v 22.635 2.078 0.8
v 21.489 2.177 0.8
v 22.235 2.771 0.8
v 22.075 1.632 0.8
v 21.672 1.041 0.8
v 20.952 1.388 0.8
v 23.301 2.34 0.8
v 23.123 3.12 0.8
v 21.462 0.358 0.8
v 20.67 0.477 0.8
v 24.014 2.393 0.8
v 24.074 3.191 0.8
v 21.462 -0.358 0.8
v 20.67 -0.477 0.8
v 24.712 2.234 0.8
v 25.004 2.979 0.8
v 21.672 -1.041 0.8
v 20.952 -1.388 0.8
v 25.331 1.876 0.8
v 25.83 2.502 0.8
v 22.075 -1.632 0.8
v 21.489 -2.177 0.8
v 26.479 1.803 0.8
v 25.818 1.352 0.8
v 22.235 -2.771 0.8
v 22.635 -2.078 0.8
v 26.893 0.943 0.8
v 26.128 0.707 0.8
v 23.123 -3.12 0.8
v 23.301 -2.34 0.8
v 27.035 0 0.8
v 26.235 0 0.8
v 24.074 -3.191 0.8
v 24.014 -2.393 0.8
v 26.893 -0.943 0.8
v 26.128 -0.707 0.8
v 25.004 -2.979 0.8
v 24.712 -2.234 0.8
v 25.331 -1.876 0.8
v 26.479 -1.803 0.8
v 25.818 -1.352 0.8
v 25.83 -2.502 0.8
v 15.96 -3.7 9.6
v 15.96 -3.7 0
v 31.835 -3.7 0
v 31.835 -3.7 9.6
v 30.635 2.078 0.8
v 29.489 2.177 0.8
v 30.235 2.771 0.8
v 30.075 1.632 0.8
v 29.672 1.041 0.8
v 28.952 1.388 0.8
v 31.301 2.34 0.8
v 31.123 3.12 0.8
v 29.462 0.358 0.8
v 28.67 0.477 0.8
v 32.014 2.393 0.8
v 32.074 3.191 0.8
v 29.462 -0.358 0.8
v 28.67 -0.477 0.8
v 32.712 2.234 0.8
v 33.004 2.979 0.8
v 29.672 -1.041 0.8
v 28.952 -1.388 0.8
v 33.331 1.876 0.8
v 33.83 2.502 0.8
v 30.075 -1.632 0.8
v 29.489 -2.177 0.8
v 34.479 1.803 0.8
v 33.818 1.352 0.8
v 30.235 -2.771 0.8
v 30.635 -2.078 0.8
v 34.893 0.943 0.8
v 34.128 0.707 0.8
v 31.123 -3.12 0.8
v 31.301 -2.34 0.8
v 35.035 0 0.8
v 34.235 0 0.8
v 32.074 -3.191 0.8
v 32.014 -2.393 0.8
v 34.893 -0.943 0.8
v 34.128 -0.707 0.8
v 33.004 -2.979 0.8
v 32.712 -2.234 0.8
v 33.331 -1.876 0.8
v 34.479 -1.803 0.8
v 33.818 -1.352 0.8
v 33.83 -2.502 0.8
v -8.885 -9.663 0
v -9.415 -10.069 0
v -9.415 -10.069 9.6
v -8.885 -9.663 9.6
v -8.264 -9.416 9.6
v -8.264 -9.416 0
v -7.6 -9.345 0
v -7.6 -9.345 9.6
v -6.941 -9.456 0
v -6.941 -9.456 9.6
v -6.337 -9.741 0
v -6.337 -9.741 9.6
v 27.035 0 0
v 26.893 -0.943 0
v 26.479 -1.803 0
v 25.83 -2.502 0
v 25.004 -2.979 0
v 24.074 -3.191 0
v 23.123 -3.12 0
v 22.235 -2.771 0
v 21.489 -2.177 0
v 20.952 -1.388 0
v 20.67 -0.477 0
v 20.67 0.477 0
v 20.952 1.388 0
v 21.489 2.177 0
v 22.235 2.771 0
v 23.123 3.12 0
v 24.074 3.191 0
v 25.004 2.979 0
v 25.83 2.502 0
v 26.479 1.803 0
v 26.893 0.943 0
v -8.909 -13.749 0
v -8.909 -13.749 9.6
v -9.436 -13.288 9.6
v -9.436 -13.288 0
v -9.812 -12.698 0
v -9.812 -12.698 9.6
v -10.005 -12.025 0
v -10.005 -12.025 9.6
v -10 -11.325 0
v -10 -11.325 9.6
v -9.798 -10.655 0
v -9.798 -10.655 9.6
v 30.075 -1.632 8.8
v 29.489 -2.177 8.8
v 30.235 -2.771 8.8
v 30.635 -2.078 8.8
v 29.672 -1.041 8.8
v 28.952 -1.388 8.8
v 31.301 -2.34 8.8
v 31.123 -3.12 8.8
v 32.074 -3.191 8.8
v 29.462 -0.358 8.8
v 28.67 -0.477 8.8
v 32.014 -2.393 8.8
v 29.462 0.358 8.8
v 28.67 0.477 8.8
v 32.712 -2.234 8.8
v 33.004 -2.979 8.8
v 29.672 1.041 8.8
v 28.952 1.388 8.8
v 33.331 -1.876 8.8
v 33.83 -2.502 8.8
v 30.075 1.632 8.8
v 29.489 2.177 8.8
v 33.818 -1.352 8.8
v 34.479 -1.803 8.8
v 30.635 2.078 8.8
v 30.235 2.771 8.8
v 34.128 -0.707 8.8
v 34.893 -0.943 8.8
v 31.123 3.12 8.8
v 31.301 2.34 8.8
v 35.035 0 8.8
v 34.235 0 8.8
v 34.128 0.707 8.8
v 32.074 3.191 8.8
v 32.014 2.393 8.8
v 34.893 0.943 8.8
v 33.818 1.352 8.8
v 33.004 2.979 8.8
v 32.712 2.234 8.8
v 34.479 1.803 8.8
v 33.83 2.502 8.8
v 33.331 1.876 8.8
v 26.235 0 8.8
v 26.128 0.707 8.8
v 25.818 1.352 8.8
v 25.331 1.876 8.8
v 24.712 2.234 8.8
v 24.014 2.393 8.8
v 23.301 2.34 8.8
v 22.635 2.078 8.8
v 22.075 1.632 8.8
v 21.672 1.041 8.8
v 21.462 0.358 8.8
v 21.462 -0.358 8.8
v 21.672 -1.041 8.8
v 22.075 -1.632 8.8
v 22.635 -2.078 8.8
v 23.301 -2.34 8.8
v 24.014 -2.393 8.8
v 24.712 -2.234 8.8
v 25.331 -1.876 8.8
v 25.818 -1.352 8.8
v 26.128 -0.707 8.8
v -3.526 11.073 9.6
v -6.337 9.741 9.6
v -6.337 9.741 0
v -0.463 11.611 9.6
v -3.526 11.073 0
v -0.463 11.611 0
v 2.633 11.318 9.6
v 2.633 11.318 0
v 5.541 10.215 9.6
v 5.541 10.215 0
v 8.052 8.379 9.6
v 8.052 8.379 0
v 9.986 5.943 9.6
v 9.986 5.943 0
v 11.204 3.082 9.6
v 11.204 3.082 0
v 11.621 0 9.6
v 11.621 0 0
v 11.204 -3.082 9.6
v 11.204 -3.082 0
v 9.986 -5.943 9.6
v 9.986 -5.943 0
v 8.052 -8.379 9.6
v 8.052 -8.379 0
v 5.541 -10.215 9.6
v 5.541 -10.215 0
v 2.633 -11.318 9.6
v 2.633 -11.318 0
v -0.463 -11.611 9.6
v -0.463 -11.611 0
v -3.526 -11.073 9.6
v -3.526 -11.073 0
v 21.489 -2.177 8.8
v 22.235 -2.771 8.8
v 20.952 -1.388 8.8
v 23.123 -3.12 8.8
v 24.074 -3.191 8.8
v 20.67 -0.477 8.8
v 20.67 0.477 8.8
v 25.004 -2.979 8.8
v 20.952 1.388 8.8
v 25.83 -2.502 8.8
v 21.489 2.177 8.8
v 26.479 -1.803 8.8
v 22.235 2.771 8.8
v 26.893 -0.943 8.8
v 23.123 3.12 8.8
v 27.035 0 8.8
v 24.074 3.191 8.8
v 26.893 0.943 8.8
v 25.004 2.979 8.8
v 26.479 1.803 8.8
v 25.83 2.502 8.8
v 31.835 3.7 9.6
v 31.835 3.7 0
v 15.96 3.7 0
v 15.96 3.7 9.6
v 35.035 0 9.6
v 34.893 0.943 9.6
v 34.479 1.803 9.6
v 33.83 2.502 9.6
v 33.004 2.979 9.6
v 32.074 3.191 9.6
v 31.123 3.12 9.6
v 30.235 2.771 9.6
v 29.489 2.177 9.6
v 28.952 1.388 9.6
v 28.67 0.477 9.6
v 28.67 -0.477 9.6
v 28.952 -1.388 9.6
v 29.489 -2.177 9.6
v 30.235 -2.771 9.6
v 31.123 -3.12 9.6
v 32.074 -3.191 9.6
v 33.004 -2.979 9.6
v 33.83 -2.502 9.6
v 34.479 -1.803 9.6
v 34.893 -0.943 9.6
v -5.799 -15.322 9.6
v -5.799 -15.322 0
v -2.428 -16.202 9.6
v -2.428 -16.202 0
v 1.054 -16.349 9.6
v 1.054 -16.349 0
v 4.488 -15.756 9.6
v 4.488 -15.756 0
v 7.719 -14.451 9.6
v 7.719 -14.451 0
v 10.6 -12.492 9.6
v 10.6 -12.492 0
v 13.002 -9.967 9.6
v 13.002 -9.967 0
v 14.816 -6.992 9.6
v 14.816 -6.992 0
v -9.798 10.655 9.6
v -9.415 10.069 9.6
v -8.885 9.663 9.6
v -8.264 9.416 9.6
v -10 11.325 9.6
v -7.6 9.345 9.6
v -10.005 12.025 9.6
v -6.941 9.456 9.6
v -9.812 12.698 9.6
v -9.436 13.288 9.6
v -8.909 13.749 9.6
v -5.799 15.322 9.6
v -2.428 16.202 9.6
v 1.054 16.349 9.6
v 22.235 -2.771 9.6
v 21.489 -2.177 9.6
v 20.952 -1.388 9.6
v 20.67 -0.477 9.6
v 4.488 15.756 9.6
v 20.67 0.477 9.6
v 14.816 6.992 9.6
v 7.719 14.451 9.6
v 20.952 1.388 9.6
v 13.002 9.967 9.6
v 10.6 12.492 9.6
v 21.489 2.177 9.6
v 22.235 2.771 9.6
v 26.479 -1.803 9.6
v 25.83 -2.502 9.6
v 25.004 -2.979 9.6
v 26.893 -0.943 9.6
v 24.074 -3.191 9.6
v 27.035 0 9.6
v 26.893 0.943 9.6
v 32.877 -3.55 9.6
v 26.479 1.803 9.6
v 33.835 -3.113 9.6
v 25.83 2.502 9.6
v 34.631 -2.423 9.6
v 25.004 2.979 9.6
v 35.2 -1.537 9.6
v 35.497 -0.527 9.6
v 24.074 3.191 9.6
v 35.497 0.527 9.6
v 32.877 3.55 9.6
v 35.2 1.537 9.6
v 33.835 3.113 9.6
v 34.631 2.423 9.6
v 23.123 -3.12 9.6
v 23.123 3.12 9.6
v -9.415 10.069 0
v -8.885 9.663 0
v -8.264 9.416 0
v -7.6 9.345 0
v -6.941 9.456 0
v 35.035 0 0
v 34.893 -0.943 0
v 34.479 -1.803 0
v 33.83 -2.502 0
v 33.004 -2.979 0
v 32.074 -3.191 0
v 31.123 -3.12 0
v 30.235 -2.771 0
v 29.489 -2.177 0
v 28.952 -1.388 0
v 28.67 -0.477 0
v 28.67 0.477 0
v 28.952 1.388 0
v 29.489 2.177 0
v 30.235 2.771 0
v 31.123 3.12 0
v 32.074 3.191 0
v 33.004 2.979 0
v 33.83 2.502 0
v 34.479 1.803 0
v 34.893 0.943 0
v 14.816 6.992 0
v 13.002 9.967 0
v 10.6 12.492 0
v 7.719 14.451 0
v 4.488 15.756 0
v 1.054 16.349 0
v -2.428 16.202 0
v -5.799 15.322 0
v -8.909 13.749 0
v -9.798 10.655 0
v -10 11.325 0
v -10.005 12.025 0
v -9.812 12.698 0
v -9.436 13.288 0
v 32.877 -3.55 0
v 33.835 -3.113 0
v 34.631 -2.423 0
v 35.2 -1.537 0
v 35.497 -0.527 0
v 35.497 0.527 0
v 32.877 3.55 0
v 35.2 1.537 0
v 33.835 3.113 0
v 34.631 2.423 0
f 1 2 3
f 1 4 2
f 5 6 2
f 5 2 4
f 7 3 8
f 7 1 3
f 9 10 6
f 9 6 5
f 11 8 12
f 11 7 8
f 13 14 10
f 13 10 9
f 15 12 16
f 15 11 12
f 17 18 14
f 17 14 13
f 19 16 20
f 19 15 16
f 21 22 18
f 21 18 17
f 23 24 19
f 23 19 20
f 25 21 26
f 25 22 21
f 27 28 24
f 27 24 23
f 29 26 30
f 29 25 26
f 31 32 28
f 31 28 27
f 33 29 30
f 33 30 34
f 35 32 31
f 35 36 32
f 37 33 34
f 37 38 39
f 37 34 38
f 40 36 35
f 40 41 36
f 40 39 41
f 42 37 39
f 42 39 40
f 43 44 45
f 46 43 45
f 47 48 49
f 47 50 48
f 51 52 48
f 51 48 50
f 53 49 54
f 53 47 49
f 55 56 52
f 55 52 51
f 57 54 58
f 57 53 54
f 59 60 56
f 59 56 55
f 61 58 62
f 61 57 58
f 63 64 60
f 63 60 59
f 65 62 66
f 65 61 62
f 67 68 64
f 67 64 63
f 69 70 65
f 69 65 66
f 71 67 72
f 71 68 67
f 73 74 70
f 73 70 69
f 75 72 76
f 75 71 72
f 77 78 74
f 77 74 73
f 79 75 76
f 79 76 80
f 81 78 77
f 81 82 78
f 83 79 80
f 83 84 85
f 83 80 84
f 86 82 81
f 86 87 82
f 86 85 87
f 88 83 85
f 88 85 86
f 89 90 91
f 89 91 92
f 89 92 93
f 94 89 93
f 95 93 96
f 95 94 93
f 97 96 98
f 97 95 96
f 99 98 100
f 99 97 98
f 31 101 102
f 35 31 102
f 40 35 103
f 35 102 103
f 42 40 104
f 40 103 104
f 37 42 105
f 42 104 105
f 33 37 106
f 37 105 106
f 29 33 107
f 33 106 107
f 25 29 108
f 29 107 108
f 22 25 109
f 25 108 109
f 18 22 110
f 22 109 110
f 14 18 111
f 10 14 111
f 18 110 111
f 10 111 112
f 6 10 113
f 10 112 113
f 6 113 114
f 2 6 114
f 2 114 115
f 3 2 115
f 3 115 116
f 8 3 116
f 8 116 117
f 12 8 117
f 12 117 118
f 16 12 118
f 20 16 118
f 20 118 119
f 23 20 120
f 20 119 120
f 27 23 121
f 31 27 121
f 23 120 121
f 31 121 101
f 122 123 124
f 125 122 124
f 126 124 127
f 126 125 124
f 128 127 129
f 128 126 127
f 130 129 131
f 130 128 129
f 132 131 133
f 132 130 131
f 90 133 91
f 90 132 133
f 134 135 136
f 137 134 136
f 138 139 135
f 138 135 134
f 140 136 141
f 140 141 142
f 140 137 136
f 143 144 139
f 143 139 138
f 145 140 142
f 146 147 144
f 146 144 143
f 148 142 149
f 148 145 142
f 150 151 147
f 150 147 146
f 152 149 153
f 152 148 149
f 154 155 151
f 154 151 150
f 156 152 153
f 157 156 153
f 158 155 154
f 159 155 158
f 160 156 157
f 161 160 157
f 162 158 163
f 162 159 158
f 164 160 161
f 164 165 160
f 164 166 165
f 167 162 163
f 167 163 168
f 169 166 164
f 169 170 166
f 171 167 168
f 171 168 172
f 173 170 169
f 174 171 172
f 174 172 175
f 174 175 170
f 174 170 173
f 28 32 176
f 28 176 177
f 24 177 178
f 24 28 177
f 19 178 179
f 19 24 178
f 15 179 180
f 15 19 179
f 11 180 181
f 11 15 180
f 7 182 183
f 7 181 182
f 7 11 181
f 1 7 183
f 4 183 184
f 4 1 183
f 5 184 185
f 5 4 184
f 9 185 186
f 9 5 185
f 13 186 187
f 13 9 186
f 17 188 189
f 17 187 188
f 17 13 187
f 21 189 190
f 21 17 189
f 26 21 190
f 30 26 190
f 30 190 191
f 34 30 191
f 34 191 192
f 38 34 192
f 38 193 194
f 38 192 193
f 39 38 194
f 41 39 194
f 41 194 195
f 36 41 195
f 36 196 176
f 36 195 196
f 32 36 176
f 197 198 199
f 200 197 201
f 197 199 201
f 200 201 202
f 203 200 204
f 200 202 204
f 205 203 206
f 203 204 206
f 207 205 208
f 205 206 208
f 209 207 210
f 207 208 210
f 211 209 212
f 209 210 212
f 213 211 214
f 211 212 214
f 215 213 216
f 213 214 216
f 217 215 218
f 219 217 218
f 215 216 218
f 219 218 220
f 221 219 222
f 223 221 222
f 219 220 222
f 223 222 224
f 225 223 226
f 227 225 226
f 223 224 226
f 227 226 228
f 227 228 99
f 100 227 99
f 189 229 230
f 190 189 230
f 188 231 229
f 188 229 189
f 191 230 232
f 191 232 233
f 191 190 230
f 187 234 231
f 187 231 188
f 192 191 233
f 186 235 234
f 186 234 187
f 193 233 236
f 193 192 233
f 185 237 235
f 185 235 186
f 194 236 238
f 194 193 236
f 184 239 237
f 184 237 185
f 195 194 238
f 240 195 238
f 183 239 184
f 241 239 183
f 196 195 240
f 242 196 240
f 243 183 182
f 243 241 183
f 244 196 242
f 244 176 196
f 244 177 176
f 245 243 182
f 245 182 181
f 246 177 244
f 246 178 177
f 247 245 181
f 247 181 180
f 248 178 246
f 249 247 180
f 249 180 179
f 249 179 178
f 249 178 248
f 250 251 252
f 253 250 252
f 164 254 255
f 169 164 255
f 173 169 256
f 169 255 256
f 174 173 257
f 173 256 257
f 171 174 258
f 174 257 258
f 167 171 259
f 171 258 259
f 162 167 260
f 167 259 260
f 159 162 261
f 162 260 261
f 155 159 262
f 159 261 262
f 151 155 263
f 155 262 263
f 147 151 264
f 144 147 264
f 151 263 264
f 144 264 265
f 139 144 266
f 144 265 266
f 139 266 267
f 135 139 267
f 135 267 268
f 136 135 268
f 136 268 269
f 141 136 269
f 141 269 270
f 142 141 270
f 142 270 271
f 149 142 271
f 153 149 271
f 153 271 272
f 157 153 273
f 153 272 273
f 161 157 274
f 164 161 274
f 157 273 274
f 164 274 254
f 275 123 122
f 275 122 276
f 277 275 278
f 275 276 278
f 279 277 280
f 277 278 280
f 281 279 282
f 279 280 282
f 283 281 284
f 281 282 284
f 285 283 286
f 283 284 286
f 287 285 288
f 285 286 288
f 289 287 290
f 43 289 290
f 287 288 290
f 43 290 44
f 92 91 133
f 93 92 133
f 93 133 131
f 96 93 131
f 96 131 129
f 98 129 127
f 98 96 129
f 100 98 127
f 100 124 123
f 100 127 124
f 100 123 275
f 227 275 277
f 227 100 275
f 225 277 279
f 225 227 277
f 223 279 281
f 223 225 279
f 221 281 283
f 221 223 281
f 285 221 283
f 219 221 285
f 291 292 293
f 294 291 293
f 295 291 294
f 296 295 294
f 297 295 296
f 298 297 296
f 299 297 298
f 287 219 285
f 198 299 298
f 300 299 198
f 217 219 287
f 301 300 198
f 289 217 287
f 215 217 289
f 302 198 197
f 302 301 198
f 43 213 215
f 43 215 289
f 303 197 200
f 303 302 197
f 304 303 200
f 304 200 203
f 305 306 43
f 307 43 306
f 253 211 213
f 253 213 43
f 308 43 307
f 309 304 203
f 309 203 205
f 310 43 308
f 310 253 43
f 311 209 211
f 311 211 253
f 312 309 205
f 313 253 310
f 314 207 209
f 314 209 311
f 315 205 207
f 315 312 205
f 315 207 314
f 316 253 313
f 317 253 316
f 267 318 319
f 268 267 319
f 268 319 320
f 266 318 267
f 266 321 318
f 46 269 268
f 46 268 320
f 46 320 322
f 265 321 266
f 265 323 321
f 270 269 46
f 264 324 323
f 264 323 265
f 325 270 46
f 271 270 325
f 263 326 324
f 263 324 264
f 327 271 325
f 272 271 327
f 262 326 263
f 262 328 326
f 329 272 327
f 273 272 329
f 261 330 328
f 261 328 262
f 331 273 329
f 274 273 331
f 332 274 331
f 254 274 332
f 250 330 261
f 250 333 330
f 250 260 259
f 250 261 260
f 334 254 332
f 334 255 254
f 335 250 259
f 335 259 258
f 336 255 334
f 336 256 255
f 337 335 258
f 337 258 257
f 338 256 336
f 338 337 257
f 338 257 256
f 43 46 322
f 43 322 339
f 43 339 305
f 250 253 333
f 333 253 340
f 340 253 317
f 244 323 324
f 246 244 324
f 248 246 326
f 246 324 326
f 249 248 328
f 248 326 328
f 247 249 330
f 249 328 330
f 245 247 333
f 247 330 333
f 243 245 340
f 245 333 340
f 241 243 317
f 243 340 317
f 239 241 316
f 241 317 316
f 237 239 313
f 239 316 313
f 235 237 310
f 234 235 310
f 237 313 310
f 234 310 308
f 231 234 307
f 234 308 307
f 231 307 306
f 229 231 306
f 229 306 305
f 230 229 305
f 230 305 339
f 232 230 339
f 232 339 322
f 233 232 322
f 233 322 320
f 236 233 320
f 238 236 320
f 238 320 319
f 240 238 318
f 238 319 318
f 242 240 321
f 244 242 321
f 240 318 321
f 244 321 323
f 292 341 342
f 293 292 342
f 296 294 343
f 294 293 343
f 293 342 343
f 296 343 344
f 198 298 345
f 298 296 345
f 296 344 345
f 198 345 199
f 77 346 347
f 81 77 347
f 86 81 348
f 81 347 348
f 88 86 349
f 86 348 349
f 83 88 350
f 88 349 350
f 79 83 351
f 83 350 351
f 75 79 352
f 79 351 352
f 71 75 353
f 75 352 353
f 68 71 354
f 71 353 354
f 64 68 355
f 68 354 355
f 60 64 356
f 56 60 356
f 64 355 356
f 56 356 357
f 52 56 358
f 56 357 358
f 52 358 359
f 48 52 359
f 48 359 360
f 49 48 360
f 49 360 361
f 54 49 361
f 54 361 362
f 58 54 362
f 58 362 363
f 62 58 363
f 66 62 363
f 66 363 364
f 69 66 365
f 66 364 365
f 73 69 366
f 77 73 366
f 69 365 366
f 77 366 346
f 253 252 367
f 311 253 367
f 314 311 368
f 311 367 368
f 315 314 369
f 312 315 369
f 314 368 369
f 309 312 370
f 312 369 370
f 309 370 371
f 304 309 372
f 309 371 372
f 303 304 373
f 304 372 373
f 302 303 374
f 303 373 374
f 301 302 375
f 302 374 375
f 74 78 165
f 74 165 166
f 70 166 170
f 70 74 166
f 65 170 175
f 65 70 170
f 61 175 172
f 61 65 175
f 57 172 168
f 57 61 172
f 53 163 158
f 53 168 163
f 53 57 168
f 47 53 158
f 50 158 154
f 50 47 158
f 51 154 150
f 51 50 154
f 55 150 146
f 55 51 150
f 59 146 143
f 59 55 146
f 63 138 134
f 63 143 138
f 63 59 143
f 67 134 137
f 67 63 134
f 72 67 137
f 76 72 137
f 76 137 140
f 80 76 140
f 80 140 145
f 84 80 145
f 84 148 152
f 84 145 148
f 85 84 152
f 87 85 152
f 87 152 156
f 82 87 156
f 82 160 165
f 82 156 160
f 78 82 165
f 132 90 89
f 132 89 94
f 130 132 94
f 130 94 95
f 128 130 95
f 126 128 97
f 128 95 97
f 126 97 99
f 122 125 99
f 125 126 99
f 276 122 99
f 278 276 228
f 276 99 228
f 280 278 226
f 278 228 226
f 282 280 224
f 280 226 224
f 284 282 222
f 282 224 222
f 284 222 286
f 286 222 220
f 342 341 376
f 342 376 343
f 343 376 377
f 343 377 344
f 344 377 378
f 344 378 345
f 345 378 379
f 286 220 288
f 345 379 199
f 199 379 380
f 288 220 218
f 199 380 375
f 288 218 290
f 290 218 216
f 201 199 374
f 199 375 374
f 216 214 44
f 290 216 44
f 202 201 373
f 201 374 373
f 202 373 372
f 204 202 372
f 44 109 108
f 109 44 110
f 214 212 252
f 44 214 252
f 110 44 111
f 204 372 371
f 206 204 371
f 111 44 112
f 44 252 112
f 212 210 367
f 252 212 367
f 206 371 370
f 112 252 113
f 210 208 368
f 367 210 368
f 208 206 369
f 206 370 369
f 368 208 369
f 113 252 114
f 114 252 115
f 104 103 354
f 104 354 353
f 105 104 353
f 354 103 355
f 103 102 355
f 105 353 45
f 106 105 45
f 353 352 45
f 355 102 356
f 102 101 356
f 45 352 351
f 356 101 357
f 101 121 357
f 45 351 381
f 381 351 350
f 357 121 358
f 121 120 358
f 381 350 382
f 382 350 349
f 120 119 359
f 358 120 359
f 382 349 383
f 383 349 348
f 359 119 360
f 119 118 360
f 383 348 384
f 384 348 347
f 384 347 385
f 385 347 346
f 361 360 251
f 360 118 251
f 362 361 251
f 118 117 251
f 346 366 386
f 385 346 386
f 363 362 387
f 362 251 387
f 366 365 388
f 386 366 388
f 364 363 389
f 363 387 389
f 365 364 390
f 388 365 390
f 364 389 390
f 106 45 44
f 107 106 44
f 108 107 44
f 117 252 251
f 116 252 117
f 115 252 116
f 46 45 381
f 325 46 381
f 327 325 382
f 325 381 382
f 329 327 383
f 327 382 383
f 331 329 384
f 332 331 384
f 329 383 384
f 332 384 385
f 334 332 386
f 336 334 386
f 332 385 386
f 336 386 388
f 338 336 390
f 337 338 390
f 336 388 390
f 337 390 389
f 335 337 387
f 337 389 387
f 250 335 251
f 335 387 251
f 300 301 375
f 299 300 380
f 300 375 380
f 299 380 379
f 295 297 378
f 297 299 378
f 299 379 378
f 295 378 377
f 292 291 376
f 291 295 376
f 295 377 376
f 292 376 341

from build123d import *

# Parameters (mm, degrees)
F1_DEPTH    = 9.6
F2_R        = 2.4
F3_DEPTH    = 9.6
F4_T1_DEPTH = 24.0803750693
F4_T3_DEPTH = 20.787199352
F5_R        = 3.2
F6_DEPTH    = 0.8
F7_R        = 3.2
F8_DEPTH    = 0.8


# Not quite as in the source:
# - a fillet or chamfer that OpenCascade refuses, or shapes differently, is made with other operations: its cross-section is extruded or revolved along the edge and cut away or added


with BuildPart() as f1:
    # F0 (on Top) → F1 (new body)
    with BuildSketch(Plane.XY):
        with BuildLine():
            Line((-11.1905737705, 11.9655232935), (-7.9375, 8.4871734989))
            ThreePointArc((-7.9375, 8.4871734989), (11.6205, 0), (-7.9375, -8.4871734989))
            Line((-7.9375, -8.4871734989), (-11.1905737705, -11.9655232935))
            ThreePointArc((-11.1905737705, -11.9655232935), (16.383, 0), (-11.1905737705, 11.9655232935))
        make_face()
    extrude(amount=F1_DEPTH)

    # F2 (on Top) → F3 (join, through all)
    with BuildSketch(Plane.XY):
        with BuildLine():
            Line((31.8347208309, 3.7), (15.9597208309, 3.7))
            ThreePointArc((15.9597208309, 3.7), (16.383, 0), (15.9597208309, -3.7))
            Line((15.9597208309, -3.7), (31.8347208309, -3.7))
            ThreePointArc((31.8347208309, -3.7), (35.5347208309, 0), (31.8347208309, 3.7))
        make_face()
        with Locations((23.8347208309, 0)):
            Circle(F2_R, mode=Mode.SUBTRACT)
        with Locations((31.8347208309, 0)):
            Circle(F2_R, mode=Mode.SUBTRACT)
    extrude(amount=F3_DEPTH)

    # F4: fillet of radius 2.4528409794 on 4 edges, made by hand

    # F4_s2 → F4_t1 (cut)
    with BuildSketch(Plane.XY.offset(-7.2401875346)):
        with BuildLine():
            ThreePointArc((-8.9088227084, 13.7490205815), (-10.0096283387, 11.9889330027), (-9.3664678562, 10.0150976715))
            Line((-9.3664678562, 10.0150976715), (-11.1905737705, 11.9655232935))
            ThreePointArc((-11.1905737705, 11.9655232935), (-10.0891848208, 12.9077898438), (-8.9088227084, 13.7490205815))
        make_face()
        with BuildLine():
            ThreePointArc((-8.9088227084, -13.7490205815), (-10.0096283387, -11.9889330027), (-9.3664678562, -10.0150976715))
            Line((-9.3664678562, -10.0150976715), (-11.1905737705, -11.9655232935))
            ThreePointArc((-11.1905737705, -11.9655232935), (-10.0891848208, -12.9077898438), (-8.9088227084, -13.7490205815))
        make_face()
    extrude(amount=F4_T1_DEPTH, mode=Mode.SUBTRACT)

    # F4_s4 → F4_t3 (cut)
    with BuildSketch(Plane.XY.offset(-5.593599676)):
        with BuildLine():
            ThreePointArc((-9.4658059224, 10.1213149191), (-7.9705260578, 9.3618595516), (-6.3367832056, 9.7406980682))
            ThreePointArc((-6.3367832056, 9.7406980682), (-7.164608937, 9.1490108225), (-7.9375, 8.4871734989))
            Line((-7.9375, 8.4871734989), (-9.4658059224, 10.1213149191))
        make_face()
        with BuildLine():
            ThreePointArc((-9.4658059224, -10.1213149191), (-7.9705260578, -9.3618595516), (-6.3367832056, -9.7406980682))
            ThreePointArc((-6.3367832056, -9.7406980682), (-7.164608937, -9.1490108225), (-7.9375, -8.4871734989))
            Line((-7.9375, -8.4871734989), (-9.4658059224, -10.1213149191))
        make_face()
    extrude(amount=F4_T3_DEPTH, mode=Mode.SUBTRACT)

    # F5 (on face) → F6 (cut)
    with BuildSketch(Plane.XY.offset(9.6)):
        with Locations((23.8347208309, 0)):
            Circle(F5_R)
        with Locations((31.8347208309, 0)):
            Circle(F5_R)
    extrude(amount=-F6_DEPTH, mode=Mode.SUBTRACT)

    # F7 (on face) → F8 (cut)
    with BuildSketch(Plane(origin=(0, 0, 0), x_dir=(1, 0, 0), z_dir=(0, 0, -1))):
        with Locations((23.8347208309, 0)):
            Circle(F7_R)
        with Locations((31.8347208309, 0)):
            Circle(F7_R)
    extrude(amount=-F8_DEPTH, mode=Mode.SUBTRACT)


solid = f1.part
